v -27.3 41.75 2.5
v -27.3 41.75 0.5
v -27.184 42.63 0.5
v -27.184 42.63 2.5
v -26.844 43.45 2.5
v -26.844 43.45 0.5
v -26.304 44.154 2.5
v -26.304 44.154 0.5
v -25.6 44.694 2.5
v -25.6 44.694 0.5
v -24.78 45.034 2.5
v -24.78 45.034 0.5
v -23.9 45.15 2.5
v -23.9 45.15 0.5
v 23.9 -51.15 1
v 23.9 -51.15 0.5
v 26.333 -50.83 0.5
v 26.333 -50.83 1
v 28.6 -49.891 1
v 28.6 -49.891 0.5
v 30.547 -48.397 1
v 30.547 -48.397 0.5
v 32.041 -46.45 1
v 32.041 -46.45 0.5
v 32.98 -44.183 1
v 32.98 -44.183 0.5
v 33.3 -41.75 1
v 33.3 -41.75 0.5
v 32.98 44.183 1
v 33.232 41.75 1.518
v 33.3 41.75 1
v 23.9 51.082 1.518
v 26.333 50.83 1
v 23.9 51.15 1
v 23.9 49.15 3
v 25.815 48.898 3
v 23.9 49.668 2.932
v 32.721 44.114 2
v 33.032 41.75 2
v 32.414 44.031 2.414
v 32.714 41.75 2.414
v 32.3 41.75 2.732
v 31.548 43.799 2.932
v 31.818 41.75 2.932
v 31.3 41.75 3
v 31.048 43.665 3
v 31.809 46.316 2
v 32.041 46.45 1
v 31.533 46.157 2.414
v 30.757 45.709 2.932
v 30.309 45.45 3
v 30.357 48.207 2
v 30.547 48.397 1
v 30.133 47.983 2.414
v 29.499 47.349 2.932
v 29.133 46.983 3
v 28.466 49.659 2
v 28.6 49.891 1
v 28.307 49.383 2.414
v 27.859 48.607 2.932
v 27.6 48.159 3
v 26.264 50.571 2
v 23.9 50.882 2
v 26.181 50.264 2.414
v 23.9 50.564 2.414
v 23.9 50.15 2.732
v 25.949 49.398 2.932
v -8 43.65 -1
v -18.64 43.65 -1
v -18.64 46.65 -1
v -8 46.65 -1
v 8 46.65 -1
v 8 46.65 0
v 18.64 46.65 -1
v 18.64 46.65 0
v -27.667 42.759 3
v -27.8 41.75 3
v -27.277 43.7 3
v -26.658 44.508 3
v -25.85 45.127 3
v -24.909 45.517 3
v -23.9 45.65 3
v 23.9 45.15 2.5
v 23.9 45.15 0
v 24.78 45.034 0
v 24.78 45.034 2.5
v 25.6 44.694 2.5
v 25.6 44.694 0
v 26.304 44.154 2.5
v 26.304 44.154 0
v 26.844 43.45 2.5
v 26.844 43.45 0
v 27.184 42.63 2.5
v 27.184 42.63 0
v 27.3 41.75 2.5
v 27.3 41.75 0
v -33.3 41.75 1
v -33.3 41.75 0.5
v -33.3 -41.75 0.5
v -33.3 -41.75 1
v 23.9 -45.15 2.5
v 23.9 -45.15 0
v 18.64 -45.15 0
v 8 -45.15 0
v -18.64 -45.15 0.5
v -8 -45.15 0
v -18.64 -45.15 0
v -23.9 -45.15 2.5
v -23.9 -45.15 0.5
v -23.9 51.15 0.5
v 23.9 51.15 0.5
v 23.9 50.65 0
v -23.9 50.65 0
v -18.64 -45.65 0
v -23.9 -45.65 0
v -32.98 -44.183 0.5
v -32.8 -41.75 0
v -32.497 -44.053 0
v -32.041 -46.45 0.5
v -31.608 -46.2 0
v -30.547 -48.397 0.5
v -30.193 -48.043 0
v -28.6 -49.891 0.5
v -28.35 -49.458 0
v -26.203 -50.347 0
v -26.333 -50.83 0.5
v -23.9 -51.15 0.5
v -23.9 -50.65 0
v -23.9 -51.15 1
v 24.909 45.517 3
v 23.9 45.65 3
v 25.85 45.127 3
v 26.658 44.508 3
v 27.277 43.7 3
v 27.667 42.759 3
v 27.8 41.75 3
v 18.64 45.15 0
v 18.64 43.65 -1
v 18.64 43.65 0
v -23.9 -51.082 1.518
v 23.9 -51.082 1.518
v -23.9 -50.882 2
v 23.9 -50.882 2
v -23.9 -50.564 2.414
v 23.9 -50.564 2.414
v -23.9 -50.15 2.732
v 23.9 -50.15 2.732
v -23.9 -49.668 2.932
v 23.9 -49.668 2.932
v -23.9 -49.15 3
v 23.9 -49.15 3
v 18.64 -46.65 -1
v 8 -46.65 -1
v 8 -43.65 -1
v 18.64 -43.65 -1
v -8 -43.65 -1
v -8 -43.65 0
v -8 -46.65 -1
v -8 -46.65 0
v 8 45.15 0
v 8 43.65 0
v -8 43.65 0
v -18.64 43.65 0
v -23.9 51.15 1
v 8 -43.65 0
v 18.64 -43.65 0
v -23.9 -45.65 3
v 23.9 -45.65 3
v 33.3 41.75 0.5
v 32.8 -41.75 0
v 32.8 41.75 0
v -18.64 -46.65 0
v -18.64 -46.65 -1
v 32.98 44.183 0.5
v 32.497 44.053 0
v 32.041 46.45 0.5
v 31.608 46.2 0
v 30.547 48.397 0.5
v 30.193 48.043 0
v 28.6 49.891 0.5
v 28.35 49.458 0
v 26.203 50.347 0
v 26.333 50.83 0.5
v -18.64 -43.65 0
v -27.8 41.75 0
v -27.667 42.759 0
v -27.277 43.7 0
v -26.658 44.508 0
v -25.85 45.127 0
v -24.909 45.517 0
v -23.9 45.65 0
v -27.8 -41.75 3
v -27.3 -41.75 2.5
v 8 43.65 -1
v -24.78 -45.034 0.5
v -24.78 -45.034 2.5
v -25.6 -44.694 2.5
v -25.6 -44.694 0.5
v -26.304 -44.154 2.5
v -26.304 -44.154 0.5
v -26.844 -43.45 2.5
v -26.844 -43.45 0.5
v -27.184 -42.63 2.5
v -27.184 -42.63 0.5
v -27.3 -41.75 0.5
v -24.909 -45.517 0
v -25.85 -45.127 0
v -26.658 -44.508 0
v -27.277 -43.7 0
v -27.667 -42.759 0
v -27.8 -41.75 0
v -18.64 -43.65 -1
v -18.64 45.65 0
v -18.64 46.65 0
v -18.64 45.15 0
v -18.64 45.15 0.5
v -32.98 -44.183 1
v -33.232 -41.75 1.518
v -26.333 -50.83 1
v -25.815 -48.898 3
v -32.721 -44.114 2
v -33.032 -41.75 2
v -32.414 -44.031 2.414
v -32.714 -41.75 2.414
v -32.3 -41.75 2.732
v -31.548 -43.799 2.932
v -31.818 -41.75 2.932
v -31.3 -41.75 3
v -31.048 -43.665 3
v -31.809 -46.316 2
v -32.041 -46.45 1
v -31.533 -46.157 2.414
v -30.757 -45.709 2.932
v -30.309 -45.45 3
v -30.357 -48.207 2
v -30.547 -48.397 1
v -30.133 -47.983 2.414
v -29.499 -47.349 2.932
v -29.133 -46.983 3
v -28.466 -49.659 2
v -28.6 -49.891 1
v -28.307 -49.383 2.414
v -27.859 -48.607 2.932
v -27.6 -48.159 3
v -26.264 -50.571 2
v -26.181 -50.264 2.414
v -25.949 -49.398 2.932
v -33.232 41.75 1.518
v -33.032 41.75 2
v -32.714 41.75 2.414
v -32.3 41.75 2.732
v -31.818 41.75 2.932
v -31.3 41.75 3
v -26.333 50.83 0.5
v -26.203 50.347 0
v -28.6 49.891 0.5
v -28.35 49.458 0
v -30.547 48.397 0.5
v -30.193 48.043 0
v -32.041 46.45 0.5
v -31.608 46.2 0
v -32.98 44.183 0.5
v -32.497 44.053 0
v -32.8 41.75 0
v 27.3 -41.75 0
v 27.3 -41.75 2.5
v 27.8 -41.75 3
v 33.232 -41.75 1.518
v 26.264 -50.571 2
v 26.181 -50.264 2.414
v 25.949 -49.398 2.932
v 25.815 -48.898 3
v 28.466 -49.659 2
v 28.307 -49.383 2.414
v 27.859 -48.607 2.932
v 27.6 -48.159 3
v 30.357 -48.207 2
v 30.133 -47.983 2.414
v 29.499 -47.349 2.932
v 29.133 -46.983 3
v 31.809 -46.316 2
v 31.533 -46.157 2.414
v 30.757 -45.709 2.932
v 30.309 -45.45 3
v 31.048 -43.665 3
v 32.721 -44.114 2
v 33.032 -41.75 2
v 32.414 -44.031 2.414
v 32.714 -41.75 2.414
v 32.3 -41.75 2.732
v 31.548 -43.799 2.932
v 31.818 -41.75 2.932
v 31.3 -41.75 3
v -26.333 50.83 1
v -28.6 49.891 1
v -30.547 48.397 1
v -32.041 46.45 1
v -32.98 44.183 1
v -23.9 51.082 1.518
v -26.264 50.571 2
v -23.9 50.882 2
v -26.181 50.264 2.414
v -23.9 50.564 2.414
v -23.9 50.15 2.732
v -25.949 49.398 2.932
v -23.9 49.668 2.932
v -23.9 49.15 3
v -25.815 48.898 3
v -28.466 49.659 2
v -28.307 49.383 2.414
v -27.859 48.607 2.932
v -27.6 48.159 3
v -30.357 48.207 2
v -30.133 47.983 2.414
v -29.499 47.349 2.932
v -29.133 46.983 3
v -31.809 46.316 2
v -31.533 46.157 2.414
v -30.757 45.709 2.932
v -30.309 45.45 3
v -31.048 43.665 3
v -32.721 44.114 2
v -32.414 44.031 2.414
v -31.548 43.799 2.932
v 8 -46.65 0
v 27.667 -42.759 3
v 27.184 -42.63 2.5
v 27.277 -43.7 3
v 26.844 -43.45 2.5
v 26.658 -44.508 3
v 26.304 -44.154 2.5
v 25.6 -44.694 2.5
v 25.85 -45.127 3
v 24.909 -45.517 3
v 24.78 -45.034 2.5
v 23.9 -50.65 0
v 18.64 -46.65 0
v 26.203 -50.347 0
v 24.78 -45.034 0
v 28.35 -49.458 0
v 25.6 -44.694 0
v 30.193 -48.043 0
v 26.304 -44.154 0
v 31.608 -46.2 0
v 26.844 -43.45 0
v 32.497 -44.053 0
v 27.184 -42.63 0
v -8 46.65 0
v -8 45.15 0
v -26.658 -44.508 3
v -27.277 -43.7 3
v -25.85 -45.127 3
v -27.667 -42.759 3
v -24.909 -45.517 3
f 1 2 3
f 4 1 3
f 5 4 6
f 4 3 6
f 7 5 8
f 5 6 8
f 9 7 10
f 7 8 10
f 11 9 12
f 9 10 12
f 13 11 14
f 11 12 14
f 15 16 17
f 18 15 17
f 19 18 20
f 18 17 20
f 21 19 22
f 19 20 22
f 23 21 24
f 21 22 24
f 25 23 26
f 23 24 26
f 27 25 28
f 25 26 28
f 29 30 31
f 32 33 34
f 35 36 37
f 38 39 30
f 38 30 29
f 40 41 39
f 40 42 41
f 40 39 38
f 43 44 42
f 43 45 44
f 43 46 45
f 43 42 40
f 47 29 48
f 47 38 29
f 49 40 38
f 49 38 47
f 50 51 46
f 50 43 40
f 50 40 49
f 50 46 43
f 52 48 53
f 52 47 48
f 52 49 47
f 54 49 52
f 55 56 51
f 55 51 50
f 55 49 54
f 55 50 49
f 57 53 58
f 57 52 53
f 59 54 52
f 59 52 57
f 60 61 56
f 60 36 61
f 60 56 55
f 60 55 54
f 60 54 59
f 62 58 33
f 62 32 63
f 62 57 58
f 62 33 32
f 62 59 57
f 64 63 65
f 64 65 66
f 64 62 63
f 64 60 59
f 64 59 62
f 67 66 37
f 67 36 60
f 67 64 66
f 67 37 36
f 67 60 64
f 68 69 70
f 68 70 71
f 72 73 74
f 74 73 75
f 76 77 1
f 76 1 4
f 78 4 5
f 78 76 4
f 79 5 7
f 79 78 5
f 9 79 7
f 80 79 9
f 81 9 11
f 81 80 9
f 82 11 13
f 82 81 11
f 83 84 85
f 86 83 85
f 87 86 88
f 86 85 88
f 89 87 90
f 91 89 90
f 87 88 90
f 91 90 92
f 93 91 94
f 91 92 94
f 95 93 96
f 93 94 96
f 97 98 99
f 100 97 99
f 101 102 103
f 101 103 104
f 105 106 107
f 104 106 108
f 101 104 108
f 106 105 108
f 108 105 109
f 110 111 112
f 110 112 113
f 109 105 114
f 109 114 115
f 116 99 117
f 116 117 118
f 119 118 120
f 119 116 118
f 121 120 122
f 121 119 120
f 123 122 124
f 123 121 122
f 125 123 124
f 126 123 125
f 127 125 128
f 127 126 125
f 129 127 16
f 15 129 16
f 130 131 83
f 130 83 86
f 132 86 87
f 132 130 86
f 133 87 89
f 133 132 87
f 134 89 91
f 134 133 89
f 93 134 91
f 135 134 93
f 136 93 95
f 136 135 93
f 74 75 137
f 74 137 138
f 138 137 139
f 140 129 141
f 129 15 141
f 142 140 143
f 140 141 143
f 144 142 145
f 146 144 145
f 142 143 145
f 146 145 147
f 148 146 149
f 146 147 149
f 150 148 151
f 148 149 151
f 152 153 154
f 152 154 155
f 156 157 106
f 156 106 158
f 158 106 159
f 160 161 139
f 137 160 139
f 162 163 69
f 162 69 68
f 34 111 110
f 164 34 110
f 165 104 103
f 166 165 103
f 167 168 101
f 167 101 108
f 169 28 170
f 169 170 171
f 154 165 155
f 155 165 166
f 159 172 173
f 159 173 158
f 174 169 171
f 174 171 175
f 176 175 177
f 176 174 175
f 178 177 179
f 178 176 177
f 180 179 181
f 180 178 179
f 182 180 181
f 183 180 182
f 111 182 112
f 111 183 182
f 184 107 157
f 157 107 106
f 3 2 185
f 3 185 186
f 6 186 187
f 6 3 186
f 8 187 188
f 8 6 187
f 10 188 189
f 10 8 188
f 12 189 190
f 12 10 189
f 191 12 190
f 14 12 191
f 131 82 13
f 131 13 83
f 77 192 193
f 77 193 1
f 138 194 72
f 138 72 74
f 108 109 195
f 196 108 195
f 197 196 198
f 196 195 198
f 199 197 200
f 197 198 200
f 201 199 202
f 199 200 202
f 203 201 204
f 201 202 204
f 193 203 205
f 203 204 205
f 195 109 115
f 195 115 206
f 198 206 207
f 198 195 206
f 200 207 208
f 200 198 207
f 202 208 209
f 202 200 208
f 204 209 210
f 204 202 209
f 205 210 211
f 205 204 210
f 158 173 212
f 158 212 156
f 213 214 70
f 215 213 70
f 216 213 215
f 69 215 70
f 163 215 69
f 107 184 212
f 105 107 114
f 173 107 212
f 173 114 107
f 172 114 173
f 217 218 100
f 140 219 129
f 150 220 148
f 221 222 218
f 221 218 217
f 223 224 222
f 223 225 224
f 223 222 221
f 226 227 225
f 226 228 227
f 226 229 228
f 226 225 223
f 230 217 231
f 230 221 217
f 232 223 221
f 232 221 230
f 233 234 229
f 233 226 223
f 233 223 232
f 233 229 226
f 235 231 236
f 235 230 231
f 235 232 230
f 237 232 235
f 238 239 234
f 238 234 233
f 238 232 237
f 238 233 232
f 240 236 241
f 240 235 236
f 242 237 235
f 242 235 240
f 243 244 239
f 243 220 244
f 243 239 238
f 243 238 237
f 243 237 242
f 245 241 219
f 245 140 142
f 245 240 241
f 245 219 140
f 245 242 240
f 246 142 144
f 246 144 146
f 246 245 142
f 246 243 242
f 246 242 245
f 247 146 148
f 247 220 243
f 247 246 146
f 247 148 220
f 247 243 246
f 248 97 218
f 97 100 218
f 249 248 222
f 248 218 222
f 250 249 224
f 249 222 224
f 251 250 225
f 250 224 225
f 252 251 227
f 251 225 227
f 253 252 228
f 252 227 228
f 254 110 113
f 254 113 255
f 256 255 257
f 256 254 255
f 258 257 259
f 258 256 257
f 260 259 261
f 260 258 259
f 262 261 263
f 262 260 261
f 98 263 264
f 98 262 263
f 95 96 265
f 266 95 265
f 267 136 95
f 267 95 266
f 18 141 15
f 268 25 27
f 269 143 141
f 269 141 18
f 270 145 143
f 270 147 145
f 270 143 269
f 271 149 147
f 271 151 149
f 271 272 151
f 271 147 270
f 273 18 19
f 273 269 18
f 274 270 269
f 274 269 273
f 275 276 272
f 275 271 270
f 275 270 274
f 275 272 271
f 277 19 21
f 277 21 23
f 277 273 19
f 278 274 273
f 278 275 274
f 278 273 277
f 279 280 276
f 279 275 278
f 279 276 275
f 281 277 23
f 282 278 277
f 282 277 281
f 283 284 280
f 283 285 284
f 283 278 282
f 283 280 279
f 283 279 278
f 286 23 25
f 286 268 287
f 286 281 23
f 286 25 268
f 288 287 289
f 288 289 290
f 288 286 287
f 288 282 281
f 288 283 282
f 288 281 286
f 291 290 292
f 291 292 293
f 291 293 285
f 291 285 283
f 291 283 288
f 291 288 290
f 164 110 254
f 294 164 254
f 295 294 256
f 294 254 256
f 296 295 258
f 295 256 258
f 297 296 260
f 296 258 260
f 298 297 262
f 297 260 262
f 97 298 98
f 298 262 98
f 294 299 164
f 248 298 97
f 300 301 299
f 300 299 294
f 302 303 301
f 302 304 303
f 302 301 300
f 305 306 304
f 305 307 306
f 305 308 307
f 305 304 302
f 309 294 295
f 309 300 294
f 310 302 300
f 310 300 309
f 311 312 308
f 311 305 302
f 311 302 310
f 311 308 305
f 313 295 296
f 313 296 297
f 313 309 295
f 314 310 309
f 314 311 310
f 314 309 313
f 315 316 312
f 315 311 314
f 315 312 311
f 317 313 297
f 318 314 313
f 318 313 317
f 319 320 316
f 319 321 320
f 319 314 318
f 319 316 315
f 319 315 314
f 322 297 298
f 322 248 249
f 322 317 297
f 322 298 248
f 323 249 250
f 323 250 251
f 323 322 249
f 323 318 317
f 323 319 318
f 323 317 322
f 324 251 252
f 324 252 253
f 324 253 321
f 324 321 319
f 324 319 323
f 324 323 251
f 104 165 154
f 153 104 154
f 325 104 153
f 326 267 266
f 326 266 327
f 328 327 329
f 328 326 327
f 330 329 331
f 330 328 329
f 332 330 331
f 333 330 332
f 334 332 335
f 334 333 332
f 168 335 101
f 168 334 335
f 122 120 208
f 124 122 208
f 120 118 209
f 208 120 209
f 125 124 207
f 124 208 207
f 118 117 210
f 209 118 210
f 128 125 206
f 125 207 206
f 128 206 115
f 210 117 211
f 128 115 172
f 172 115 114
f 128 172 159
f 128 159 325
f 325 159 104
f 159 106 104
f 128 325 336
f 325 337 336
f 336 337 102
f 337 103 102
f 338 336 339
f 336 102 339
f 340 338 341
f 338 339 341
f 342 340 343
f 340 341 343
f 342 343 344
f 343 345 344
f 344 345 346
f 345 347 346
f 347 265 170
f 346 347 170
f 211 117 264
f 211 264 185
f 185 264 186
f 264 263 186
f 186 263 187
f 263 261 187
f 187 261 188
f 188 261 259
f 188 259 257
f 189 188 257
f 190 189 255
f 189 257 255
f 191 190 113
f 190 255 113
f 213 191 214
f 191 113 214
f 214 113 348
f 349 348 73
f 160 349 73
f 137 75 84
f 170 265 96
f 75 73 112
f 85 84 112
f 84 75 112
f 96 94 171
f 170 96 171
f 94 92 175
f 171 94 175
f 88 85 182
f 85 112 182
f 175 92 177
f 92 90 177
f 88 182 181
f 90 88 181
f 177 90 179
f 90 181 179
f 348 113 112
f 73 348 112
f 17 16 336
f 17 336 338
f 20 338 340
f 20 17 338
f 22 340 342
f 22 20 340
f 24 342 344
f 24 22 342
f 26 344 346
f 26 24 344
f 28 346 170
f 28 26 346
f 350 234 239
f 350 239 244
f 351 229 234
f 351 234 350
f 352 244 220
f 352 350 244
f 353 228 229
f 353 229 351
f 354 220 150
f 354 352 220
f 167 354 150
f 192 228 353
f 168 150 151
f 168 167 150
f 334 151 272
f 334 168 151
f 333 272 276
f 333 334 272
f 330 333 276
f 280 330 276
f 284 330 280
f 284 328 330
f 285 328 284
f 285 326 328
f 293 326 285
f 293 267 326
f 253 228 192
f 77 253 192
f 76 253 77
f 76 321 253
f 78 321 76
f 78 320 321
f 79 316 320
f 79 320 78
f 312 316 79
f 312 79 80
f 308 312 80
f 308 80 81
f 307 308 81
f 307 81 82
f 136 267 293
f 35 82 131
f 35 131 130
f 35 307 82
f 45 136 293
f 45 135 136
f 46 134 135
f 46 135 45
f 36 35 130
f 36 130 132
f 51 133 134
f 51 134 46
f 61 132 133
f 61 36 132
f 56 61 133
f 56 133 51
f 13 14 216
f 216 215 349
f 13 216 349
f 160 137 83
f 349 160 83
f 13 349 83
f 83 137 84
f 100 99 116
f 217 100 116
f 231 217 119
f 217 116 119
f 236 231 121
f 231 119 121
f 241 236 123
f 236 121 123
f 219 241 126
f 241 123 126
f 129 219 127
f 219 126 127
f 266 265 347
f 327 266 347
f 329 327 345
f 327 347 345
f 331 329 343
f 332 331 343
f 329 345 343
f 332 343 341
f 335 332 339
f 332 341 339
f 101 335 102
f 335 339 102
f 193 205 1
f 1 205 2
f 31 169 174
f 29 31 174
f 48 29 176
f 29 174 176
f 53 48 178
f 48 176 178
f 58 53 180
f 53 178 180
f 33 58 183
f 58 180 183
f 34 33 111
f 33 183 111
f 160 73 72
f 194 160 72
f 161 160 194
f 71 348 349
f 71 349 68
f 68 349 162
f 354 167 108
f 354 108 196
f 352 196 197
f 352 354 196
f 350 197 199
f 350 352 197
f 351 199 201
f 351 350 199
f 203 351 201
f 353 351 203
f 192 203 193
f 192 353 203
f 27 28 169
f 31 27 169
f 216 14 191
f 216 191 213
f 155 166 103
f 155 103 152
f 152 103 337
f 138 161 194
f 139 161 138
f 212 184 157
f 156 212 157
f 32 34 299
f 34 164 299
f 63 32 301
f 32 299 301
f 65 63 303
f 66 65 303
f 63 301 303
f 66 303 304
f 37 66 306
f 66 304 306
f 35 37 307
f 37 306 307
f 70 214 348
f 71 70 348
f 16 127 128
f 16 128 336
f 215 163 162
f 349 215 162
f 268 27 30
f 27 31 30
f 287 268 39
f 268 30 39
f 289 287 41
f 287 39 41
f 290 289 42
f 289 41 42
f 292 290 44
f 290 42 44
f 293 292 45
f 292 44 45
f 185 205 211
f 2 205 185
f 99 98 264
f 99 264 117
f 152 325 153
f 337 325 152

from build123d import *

# Parameters (mm, degrees)
F1_DEPTH = 3
F2_R     = 2
F3_W     = 10.639583
F3_H     = 3
F4_DEPTH = 1
F5_SIZE  = 0.5


with BuildPart() as f1:
    # F0 (on Top) → F1 (new body)
    with BuildSketch(Plane.XY):
        with BuildLine():
            Line((-33.3, 41.75), (-33.3, -41.75))
            ThreePointArc((-33.3, -41.75), (-30.546804, -48.396804), (-23.9, -51.15))
            Line((-23.9, -51.15), (23.9, -51.15))
            ThreePointArc((23.9, -51.15), (30.546804, -48.396804), (33.3, -41.75))
            Line((33.3, -41.75), (33.3, 41.75))
            ThreePointArc((33.3, 41.75), (30.546804, 48.396804), (23.9, 51.15))
            Line((23.9, 51.15), (-23.9, 51.15))
            ThreePointArc((-23.9, 51.15), (-30.546804, 48.396804), (-33.3, 41.75))
        make_face()
        with BuildLine():
            ThreePointArc((27.3, -41.75), (26.304163, -44.154163), (23.9, -45.15))
            Line((23.9, -45.15), (-23.9, -45.15))
            ThreePointArc((-23.9, -45.15), (-26.304163, -44.154163), (-27.3, -41.75))
            Line((-27.3, -41.75), (-27.3, 41.75))
            ThreePointArc((-27.3, 41.75), (-26.304163, 44.154163), (-23.9, 45.15))
            Line((-23.9, 45.15), (23.9, 45.15))
            ThreePointArc((23.9, 45.15), (26.304163, 44.154163), (27.3, 41.75))
            Line((27.3, 41.75), (27.3, -41.75))
        make_face(mode=Mode.SUBTRACT)
    extrude(amount=F1_DEPTH)

    # F2
    f2_edges = [f1.edges().sort_by_distance(p)[0] for p in [
        (-33.3, 0, 3),
    ]]
    fillet(f2_edges, radius=F2_R)

    # F3 (on face) → F4 (join)
    with BuildSketch(Plane(origin=(0, 0, 0), x_dir=(1, 0, 0), z_dir=(0, 0, -1))):
        with Locations((-13.319791, -45.15)):
            Rectangle(F3_W, F3_H)
        with Locations((13.319791, -45.15)):
            Rectangle(F3_W, F3_H)
        with Locations((-13.319791, 45.15)):
            Rectangle(F3_W, F3_H)
        with Locations((13.319791, 45.15)):
            Rectangle(F3_W, F3_H)
    extrude(amount=F4_DEPTH)

    # F5
    f5_edges = [f1.edges().sort_by_distance(p)[0] for p in [
        (0, 45.15, 3),
        (-27.3, 0, 0),
        (-33.3, 0, 0),
    ]]
    chamfer(f5_edges, length=F5_SIZE)


solid = f1.part
